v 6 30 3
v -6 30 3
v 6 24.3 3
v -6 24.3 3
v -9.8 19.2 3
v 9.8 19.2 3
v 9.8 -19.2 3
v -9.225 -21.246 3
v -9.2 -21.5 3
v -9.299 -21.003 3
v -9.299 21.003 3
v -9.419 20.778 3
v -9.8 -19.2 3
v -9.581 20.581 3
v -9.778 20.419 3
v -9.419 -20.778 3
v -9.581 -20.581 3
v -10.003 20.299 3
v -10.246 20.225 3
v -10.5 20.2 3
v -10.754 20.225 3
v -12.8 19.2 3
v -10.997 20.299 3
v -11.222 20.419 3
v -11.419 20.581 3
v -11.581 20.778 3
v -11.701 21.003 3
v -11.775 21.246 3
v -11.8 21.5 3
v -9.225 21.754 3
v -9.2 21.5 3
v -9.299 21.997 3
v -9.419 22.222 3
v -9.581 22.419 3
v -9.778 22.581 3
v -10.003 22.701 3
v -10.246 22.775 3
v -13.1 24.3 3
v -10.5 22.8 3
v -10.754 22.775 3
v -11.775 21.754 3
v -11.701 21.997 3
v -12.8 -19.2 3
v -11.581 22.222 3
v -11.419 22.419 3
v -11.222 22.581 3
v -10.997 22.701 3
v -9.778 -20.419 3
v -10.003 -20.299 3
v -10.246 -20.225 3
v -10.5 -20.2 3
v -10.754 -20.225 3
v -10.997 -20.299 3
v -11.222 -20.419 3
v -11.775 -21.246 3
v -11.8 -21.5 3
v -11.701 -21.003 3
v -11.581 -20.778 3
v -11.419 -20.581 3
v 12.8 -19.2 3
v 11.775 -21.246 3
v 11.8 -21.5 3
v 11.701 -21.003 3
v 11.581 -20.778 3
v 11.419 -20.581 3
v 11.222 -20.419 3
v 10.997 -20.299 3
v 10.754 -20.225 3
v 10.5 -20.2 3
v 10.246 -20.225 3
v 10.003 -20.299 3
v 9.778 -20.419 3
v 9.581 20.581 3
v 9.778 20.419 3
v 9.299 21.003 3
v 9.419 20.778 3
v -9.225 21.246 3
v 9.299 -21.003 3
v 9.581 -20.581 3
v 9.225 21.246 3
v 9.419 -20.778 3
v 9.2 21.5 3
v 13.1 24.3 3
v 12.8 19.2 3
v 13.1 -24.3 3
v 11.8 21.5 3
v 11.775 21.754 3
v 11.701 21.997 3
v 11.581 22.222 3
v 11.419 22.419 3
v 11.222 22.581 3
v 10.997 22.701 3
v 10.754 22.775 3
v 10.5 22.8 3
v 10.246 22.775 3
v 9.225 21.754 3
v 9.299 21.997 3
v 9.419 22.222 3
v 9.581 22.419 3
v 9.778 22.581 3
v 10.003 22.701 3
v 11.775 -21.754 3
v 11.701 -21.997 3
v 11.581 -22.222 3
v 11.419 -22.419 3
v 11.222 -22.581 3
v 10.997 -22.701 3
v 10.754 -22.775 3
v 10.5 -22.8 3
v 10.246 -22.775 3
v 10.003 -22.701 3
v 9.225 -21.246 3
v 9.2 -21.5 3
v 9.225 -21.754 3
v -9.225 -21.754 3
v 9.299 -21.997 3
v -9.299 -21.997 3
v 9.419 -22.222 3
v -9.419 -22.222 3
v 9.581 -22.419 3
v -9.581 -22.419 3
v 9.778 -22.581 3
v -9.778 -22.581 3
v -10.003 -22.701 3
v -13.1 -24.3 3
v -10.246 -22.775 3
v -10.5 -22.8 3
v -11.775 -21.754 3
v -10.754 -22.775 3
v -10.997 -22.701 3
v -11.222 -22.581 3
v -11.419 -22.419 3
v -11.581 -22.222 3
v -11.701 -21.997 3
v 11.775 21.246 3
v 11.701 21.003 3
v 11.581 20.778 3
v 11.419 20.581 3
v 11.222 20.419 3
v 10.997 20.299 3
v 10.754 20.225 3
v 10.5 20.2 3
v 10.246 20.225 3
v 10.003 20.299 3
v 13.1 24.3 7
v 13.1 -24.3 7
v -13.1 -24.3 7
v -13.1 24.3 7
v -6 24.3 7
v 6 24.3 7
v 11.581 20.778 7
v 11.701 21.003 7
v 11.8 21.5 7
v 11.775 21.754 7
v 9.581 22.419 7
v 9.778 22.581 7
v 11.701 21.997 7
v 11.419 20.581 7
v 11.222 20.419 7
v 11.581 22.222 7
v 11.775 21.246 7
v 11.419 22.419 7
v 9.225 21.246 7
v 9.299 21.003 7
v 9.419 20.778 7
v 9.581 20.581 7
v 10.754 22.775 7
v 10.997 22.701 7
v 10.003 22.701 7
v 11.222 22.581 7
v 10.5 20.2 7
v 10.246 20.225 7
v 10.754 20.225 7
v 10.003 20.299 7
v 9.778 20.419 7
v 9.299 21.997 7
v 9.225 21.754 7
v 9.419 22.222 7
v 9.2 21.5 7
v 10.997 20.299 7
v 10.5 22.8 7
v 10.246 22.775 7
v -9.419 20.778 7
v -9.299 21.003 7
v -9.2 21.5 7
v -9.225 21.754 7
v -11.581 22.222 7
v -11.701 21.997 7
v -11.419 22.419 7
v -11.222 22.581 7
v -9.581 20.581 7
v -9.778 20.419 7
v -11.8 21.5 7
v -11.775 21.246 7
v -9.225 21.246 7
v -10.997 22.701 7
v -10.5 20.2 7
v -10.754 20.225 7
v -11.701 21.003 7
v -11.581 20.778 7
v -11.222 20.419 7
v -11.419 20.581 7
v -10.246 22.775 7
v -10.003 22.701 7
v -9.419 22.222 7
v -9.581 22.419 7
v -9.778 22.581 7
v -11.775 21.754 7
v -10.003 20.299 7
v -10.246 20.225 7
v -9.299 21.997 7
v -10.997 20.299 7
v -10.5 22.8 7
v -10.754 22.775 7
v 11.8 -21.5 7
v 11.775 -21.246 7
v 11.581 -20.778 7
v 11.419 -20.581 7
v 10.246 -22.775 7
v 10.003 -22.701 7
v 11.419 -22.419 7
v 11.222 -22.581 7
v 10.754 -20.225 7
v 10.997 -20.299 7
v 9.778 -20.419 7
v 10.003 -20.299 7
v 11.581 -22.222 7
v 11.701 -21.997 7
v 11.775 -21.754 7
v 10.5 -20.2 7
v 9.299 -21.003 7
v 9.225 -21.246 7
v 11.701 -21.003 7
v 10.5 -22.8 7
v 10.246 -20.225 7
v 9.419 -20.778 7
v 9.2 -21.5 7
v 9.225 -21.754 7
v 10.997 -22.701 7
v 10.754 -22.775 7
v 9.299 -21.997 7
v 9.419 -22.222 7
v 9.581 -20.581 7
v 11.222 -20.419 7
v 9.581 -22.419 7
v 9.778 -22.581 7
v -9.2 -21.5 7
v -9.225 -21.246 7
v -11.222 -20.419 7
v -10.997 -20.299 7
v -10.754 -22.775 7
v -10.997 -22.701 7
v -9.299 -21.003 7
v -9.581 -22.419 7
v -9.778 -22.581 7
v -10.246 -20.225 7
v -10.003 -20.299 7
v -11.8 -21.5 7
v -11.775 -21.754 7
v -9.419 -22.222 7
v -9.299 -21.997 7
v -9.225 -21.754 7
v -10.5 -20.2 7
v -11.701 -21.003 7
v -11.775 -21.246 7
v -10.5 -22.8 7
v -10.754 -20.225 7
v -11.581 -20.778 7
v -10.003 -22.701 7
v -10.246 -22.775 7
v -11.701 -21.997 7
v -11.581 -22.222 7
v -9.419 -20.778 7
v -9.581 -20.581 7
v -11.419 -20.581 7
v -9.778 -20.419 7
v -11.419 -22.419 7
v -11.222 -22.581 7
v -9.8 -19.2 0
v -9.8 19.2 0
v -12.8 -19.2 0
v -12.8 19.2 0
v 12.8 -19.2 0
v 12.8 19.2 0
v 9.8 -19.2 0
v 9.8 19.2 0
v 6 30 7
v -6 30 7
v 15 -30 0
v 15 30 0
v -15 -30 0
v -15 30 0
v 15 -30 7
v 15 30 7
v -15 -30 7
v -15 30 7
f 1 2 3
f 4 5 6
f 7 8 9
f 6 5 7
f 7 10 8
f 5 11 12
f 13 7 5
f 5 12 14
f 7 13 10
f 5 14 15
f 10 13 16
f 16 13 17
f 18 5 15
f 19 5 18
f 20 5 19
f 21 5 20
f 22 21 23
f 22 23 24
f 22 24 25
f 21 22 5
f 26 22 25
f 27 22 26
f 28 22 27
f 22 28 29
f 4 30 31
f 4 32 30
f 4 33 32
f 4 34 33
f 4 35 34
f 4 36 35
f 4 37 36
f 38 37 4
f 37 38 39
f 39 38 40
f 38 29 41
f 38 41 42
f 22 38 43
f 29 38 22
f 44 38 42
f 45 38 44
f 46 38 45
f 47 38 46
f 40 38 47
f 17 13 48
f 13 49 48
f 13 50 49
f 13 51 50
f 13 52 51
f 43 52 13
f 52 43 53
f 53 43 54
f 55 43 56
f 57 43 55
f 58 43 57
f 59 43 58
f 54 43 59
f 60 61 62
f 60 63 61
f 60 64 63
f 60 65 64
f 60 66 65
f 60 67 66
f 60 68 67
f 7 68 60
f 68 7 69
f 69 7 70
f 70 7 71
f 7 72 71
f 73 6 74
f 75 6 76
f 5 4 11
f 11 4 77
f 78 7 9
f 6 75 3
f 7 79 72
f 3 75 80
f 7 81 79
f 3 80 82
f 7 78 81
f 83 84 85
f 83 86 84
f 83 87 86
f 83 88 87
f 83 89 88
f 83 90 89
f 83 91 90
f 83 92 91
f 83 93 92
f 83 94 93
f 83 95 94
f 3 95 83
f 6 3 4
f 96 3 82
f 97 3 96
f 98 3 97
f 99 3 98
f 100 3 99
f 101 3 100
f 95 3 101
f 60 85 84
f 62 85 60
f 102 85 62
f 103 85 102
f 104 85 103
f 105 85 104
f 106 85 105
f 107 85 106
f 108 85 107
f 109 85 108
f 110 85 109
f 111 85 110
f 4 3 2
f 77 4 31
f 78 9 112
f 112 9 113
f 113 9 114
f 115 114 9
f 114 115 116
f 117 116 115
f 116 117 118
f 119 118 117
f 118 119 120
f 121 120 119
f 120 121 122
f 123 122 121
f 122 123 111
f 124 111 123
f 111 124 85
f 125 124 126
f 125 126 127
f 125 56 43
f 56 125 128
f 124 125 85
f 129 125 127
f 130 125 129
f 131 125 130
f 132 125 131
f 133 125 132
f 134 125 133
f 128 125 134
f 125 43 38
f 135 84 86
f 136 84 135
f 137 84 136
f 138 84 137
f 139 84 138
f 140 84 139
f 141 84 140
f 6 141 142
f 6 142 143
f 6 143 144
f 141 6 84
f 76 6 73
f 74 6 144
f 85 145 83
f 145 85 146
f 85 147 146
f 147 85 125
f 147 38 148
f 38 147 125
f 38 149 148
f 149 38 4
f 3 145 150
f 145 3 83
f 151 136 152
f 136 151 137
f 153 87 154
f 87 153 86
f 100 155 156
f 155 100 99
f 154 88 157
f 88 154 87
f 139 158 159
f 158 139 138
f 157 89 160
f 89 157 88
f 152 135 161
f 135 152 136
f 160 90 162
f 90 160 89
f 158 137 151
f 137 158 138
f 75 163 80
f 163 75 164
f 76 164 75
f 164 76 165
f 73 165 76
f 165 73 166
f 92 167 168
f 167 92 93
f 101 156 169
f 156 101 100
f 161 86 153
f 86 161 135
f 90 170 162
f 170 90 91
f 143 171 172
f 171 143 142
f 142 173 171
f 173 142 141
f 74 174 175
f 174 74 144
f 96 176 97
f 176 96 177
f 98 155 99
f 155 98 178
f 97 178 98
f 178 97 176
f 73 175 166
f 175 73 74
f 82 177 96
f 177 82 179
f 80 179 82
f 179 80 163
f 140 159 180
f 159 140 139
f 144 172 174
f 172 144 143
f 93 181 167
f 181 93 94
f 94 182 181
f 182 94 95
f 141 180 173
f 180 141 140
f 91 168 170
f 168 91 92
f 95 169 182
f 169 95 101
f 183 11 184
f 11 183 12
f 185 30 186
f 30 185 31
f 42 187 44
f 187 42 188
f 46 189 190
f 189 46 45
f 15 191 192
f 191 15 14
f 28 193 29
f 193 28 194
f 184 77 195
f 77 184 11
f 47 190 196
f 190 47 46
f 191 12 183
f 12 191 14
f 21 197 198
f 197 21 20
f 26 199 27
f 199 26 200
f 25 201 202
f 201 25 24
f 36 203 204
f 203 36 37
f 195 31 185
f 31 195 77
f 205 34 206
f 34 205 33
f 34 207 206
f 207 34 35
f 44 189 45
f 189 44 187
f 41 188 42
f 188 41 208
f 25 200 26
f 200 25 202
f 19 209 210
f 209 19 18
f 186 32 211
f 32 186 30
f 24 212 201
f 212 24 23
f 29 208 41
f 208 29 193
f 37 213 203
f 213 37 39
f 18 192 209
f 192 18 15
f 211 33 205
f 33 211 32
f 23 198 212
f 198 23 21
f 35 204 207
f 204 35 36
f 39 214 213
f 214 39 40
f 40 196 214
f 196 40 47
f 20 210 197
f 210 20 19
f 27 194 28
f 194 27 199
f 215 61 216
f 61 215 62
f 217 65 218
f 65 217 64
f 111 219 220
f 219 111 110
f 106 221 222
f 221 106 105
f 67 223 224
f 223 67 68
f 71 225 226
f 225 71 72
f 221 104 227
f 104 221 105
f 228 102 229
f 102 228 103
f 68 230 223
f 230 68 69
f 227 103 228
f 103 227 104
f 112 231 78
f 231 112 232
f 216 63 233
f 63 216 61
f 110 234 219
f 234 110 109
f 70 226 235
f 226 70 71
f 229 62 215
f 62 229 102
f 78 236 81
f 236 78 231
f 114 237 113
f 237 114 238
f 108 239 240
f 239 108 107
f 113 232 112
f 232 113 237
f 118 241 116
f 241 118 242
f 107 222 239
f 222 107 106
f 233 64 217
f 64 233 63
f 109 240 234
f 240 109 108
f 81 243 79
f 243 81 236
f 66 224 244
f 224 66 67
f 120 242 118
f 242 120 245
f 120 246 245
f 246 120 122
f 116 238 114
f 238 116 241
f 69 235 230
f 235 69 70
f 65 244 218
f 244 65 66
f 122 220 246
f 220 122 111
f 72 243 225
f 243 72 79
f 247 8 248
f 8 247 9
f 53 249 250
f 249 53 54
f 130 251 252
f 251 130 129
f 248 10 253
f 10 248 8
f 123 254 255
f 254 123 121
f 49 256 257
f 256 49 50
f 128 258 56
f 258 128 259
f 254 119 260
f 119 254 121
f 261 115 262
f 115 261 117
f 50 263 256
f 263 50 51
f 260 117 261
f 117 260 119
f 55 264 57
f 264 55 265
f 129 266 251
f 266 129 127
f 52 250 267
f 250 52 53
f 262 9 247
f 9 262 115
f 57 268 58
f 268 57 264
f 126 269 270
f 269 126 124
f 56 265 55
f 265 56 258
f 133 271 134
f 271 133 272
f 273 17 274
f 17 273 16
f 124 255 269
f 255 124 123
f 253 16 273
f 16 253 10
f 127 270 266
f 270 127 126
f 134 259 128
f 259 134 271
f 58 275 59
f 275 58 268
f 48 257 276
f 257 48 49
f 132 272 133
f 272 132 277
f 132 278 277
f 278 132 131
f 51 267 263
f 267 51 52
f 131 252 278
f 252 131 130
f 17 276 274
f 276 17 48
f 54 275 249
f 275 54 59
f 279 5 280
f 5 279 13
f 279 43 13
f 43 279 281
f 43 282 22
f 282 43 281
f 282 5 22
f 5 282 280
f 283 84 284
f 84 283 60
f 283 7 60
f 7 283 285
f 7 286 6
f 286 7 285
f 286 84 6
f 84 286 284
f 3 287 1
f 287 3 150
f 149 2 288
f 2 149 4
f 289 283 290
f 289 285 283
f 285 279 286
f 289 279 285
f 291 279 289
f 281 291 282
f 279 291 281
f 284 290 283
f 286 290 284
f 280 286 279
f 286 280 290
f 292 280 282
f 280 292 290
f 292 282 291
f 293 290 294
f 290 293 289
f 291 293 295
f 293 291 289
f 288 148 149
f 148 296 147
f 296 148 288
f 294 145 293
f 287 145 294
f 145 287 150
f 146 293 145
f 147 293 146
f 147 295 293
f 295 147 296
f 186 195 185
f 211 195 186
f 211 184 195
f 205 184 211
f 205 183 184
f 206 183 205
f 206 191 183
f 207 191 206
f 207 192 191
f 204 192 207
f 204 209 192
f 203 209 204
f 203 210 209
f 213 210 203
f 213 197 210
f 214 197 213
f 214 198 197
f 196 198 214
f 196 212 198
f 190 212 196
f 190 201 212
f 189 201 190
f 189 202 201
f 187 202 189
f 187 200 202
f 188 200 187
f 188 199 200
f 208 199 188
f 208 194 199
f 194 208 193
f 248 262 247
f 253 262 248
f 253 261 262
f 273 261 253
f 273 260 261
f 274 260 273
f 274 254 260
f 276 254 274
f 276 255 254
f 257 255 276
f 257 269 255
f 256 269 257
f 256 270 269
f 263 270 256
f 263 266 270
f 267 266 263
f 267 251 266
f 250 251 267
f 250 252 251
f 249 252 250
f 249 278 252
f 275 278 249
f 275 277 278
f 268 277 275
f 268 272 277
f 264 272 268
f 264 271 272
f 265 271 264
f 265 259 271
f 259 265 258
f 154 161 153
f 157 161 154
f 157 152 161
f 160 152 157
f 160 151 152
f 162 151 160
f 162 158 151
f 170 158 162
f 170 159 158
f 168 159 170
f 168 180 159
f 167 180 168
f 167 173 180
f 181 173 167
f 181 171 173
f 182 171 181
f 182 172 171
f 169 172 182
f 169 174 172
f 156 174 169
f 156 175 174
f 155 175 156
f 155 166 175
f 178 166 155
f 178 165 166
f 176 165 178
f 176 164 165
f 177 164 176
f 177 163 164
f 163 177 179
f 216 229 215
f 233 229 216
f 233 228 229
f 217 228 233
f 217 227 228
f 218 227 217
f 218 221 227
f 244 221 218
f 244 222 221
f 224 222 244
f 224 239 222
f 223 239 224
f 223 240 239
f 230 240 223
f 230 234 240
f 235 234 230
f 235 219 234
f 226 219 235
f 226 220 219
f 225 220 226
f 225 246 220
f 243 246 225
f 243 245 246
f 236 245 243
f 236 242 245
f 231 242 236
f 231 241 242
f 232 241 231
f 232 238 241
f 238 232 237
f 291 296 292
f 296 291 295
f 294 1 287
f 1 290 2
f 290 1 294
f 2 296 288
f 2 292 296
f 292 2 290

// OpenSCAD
difference()
{
    linear_extrude(height = 7.0, twist = 0.0, scale = 1.0, slices = 1, center = false)
    {
        scale([30.0, 60.0])
        {
            M8();
        }
    }
    translate([0.0, 0.0, 3.0])
    {
        union()
        {
            union()
            {
                difference()
                {
                    linear_extrude(height = 6.0, twist = 0.0, scale = 1.0, slices = 1, center = false)
                    {
                        scale([26.2, 48.6])
                        {
                            M8();
                        }
                    }
                    translate([10.5, 21.5, 0.0])
                    {
                        translate([0.0, 0.0, -1.0])
                        {
                            linear_extrude(height = 8.0, twist = 0.0, scale = 1.0, slices = 1, center = false)
                            {
                                scale([2.6, 2.6])
                                {
                                    M52();
                                }
                            }
                        }
                    }
                    translate([-10.5, 21.5, 0.0])
                    {
                        translate([0.0, 0.0, -1.0])
                        {
                            linear_extrude(height = 8.0, twist = 0.0, scale = 1.0, slices = 1, center = false)
                            {
                                scale([2.6, 2.6])
                                {
                                    M52();
                                }
                            }
                        }
                    }
                    translate([10.5, -21.5, 0.0])
                    {
                        translate([0.0, 0.0, -1.0])
                        {
                            linear_extrude(height = 8.0, twist = 0.0, scale = 1.0, slices = 1, center = false)
                            {
                                scale([2.6, 2.6])
                                {
                                    M52();
                                }
                            }
                        }
                    }
                    translate([-10.5, -21.5, 0.0])
                    {
                        translate([0.0, 0.0, -1.0])
                        {
                            linear_extrude(height = 8.0, twist = 0.0, scale = 1.0, slices = 1, center = false)
                            {
                                scale([2.6, 2.6])
                                {
                                    M52();
                                }
                            }
                        }
                    }
                }
                translate([-11.3, 0.0, 0.0])
                {
                    translate([0.0, 0.0, -10.0])
                    {
                        linear_extrude(height = 11.0, twist = 0.0, scale = 1.0, slices = 1, center = false)
                        {
                            scale([3.0, 38.4])
                            {
                                M8();
                            }
                        }
                    }
                }
                translate([11.3, 0.0, 0.0])
                {
                    translate([0.0, 0.0, -10.0])
                    {
                        linear_extrude(height = 11.0, twist = 0.0, scale = 1.0, slices = 1, center = false)
                        {
                            scale([3.0, 38.4])
                            {
                                M8();
                            }
                        }
                    }
                }
            }
            translate([0.0, 33.8, 0.0])
            {
                translate([0.0, 0.0, 0.0])
                {
                    linear_extrude(height = 6.0, twist = 0.0, scale = 1.0, slices = 1, center = false)
                    {
                        scale([12.0, 21.0])
                        {
                            M8();
                        }
                    }
                }
            }
        }
    }
}

module M52()
{
    polygon
    (
        points =
        [
            [0.5, 0.0], 
            [0.4903926402016152, 0.09754516100806412], 
            [0.46193976625564337, 0.1913417161825449], 
            [0.4157348061512726, 0.2777851165098011], 
            [0.3535533905932738, 0.35355339059327373], 
            [0.27778511650980114, 0.4157348061512726], 
            [0.19134171618254492, 0.46193976625564337], 
            [0.09754516100806417, 0.4903926402016152], 
            [3.061616997868383E-17, 0.5], 
            [-0.0975451610080641, 0.4903926402016152], 
            [-0.19134171618254486, 0.46193976625564337], 
            [-0.277785116509801, 0.41573480615127273], 
            [-0.35355339059327373, 0.3535533905932738], 
            [-0.4157348061512727, 0.2777851165098011], 
            [-0.46193976625564337, 0.19134171618254495], 
            [-0.4903926402016152, 0.0975451610080643], 
            [-0.5, 6.123233995736766E-17], 
            [-0.4903926402016152, -0.09754516100806418], 
            [-0.4619397662556434, -0.19134171618254484], 
            [-0.41573480615127273, -0.277785116509801], 
            [-0.35355339059327384, -0.35355339059327373], 
            [-0.2777851165098011, -0.4157348061512726], 
            [-0.19134171618254517, -0.46193976625564326], 
            [-0.09754516100806433, -0.49039264020161516], 
            [-9.184850993605148E-17, -0.5], 
            [0.09754516100806415, -0.4903926402016152], 
            [0.191341716182545, -0.4619397662556433], 
            [0.2777851165098009, -0.41573480615127273], 
            [0.3535533905932737, -0.35355339059327384], 
            [0.4157348061512726, -0.2777851165098011], 
            [0.46193976625564326, -0.1913417161825452], 
            [0.49039264020161516, -0.09754516100806436]
        ],
        paths =
        [
            [0, 1, 2, 3, 4, 5, 6, 7, 8, 9, 10, 11, 12, 13, 14, 15, 16, 17, 18, 19, 20, 21, 22, 23, 24, 25, 26, 27, 28, 29, 30, 31]
        ]
    );
}

module M8()
{
    polygon
    (
        points =
        [
            [-0.5, -0.5], 
            [0.5, -0.5], 
            [0.5, 0.5], 
            [-0.5, 0.5]
        ],
        paths =
        [
            [0, 1, 2, 3]
        ]
    );
}
